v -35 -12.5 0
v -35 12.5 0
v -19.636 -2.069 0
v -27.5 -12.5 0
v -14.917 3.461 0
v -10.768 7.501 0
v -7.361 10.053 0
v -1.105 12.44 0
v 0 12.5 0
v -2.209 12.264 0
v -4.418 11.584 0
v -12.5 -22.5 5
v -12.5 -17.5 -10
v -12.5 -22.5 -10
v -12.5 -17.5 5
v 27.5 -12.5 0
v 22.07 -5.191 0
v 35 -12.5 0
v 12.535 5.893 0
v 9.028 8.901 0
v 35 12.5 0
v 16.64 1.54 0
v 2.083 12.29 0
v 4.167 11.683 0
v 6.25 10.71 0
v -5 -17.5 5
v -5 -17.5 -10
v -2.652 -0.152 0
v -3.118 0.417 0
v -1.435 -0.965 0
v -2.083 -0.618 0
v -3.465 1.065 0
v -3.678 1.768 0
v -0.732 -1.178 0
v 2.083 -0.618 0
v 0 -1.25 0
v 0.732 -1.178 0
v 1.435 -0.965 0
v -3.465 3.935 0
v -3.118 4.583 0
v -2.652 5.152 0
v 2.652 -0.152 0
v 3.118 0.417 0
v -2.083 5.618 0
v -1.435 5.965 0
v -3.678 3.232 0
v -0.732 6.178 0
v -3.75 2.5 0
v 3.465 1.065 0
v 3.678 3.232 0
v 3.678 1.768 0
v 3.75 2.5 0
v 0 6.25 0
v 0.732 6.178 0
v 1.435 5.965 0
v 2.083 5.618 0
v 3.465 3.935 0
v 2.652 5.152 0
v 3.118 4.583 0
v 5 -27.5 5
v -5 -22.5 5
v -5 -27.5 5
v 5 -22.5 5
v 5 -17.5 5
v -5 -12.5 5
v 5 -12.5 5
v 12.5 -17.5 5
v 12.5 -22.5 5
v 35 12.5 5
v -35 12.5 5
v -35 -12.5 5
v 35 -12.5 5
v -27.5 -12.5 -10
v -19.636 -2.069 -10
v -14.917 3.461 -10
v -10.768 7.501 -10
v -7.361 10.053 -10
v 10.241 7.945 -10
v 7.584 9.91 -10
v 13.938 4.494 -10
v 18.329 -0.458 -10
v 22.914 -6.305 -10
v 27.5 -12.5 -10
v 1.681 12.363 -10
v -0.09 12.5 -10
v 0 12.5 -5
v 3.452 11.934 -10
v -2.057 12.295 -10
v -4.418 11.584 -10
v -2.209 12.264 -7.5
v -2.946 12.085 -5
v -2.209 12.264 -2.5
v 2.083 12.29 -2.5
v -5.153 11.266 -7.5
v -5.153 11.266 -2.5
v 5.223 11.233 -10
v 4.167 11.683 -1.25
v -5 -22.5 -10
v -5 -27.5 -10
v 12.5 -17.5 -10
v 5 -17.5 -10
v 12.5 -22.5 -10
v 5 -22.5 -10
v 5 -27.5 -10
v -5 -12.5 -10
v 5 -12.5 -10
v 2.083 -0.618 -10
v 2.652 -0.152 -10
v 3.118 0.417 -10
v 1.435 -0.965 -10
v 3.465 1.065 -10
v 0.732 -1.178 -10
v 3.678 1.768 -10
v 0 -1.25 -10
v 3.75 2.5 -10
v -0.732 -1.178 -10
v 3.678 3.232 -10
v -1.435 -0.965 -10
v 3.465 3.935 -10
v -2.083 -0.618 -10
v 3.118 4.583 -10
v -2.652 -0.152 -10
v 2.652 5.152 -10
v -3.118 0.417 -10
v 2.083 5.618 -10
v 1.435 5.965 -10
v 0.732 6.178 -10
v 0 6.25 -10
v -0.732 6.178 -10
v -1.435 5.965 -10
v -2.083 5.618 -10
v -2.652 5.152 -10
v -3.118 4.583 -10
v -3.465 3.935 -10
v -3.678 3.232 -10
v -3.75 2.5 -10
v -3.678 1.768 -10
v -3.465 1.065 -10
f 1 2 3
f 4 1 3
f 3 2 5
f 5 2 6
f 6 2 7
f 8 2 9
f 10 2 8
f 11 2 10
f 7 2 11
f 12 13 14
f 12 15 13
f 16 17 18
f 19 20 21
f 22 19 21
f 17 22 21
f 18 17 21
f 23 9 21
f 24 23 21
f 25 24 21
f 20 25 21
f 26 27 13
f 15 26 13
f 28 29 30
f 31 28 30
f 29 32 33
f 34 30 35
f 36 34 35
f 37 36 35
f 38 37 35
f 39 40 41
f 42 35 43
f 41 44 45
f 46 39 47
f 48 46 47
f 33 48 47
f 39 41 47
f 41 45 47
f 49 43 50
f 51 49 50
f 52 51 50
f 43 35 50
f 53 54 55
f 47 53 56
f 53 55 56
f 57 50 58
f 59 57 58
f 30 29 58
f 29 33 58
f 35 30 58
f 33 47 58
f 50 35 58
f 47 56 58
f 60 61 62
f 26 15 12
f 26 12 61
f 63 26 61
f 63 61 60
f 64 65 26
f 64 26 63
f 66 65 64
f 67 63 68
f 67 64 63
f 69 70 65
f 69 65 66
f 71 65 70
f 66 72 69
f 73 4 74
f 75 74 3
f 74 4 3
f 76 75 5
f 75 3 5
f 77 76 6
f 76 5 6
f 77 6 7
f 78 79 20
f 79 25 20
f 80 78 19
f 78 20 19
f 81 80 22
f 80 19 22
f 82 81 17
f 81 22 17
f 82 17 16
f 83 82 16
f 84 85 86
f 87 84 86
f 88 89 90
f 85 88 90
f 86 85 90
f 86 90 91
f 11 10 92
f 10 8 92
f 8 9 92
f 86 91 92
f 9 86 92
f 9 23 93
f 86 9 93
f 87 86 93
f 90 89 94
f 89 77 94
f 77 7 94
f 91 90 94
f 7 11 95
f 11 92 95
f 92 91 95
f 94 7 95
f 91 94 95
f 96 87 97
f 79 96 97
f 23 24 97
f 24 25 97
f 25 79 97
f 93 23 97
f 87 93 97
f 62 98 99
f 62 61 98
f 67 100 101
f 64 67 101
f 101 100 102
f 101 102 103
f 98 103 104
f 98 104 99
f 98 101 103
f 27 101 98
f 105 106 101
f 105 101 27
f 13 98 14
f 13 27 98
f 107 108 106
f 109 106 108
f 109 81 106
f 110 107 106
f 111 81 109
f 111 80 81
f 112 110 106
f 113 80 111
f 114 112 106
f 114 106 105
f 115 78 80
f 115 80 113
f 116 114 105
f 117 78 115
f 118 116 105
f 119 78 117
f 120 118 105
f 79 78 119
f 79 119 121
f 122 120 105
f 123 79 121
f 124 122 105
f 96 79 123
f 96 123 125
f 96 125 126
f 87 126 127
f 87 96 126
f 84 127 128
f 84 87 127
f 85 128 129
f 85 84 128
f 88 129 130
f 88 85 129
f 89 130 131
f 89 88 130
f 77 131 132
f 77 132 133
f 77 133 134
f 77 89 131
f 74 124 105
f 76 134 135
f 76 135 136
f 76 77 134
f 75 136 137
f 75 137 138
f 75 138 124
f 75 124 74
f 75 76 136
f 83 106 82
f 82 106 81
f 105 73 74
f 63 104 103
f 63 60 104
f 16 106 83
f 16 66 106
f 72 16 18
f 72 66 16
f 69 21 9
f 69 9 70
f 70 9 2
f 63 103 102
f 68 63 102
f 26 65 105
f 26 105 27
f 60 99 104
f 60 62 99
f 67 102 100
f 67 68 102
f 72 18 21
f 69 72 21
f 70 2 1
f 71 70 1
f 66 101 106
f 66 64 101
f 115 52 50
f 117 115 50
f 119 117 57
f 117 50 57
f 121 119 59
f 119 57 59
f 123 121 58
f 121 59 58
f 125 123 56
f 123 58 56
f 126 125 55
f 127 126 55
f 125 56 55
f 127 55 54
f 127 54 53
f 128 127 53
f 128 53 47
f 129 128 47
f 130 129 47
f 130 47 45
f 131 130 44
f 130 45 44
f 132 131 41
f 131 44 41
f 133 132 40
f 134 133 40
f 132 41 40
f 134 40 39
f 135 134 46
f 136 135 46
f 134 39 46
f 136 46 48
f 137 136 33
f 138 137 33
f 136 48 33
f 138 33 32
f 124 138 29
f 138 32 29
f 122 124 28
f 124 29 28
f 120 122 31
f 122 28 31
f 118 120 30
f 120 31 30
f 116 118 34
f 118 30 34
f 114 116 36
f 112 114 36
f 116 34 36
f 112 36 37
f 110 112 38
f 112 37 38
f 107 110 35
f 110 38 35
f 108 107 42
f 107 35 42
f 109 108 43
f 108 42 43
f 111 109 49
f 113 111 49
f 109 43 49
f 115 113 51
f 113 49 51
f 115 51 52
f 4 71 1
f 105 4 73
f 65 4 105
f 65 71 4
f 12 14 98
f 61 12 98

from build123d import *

# Parameters (mm, degrees)
F0_R     = 3.75
F1_DEPTH = 5
F2_DEPTH = 10
F3_DEPTH = 5


with BuildPart() as f1:
    # F0 (on Top) → F1 (new body)
    with BuildSketch(Plane.XY):
        with BuildLine():
            Line((35, 12.5), (0, 12.5))
            add(Edge.make_bspline(
                [(0, 12.5), (9.166667, 12.5), (18.333333, 0), (27.5, -12.5)],
                knots=[37.165172, 37.165172, 37.165172, 37.165172, 74.330344, 74.330344, 74.330344, 74.330344], degree=3))
            Line((27.5, -12.5), (35, -12.5))
            Line((35, -12.5), (35, 12.5))
        make_face()
        with BuildLine():
            Line((0, 12.5), (-35, 12.5))
            Line((-35, 12.5), (-35, -12.5))
            Line((-35, -12.5), (-27.5, -12.5))
            add(Edge.make_bspline(
                [(-27.5, -12.5), (-18.333333, 0), (-9.166667, 12.5), (0, 12.5)],
                knots=[0, 0, 0, 0, 37.165172, 37.165172, 37.165172, 37.165172], degree=3))
        make_face()
        with BuildLine():
            add(Edge.make_bspline(
                [(0, 12.5), (9.166667, 12.5), (18.333333, 0), (27.5, -12.5)],
                knots=[37.165172, 37.165172, 37.165172, 37.165172, 74.330344, 74.330344, 74.330344, 74.330344], degree=3))
            add(Edge.make_bspline(
                [(-27.5, -12.5), (-18.333333, 0), (-9.166667, 12.5), (0, 12.5)],
                knots=[0, 0, 0, 0, 37.165172, 37.165172, 37.165172, 37.165172], degree=3))
            Line((-27.5, -12.5), (-5, -12.5))
            Line((-5, -12.5), (5, -12.5))
            Line((5, -12.5), (27.5, -12.5))
        make_face()
        with Locations((0, 2.5)):
            Circle(F0_R, mode=Mode.SUBTRACT)
        Polygon((5, -12.5), (-5, -12.5), (-5, -17.5), (-12.5, -17.5), (-12.5, -22.5), (-5, -22.5), (-5, -27.5), (0, -27.5), (5, -27.5), (5, -22.5), (12.5, -22.5), (12.5, -17.5), (5, -17.5), align=None)
    extrude(amount=F1_DEPTH)

    # F0 (on Top) → F2 (join)
    with BuildSketch(Plane.XY):
        with BuildLine():
            add(Edge.make_bspline(
                [(0, 12.5), (9.166667, 12.5), (18.333333, 0), (27.5, -12.5)],
                knots=[37.165172, 37.165172, 37.165172, 37.165172, 74.330344, 74.330344, 74.330344, 74.330344], degree=3))
            add(Edge.make_bspline(
                [(-27.5, -12.5), (-18.333333, 0), (-9.166667, 12.5), (0, 12.5)],
                knots=[0, 0, 0, 0, 37.165172, 37.165172, 37.165172, 37.165172], degree=3))
            Line((-27.5, -12.5), (-5, -12.5))
            Line((-5, -12.5), (5, -12.5))
            Line((5, -12.5), (27.5, -12.5))
        make_face()
        with Locations((0, 2.5)):
            Circle(F0_R, mode=Mode.SUBTRACT)
        Polygon((5, -12.5), (-5, -12.5), (-5, -17.5), (-12.5, -17.5), (-12.5, -22.5), (-5, -22.5), (-5, -27.5), (0, -27.5), (5, -27.5), (5, -22.5), (12.5, -22.5), (12.5, -17.5), (5, -17.5), align=None)
    extrude(amount=-F2_DEPTH)

    # F0 (on Top) → F3 (join)
    with BuildSketch(Plane.XY):
        with Locations((0, 2.5)):
            Circle(F0_R)
    extrude(amount=F3_DEPTH)


solid = f1.part
